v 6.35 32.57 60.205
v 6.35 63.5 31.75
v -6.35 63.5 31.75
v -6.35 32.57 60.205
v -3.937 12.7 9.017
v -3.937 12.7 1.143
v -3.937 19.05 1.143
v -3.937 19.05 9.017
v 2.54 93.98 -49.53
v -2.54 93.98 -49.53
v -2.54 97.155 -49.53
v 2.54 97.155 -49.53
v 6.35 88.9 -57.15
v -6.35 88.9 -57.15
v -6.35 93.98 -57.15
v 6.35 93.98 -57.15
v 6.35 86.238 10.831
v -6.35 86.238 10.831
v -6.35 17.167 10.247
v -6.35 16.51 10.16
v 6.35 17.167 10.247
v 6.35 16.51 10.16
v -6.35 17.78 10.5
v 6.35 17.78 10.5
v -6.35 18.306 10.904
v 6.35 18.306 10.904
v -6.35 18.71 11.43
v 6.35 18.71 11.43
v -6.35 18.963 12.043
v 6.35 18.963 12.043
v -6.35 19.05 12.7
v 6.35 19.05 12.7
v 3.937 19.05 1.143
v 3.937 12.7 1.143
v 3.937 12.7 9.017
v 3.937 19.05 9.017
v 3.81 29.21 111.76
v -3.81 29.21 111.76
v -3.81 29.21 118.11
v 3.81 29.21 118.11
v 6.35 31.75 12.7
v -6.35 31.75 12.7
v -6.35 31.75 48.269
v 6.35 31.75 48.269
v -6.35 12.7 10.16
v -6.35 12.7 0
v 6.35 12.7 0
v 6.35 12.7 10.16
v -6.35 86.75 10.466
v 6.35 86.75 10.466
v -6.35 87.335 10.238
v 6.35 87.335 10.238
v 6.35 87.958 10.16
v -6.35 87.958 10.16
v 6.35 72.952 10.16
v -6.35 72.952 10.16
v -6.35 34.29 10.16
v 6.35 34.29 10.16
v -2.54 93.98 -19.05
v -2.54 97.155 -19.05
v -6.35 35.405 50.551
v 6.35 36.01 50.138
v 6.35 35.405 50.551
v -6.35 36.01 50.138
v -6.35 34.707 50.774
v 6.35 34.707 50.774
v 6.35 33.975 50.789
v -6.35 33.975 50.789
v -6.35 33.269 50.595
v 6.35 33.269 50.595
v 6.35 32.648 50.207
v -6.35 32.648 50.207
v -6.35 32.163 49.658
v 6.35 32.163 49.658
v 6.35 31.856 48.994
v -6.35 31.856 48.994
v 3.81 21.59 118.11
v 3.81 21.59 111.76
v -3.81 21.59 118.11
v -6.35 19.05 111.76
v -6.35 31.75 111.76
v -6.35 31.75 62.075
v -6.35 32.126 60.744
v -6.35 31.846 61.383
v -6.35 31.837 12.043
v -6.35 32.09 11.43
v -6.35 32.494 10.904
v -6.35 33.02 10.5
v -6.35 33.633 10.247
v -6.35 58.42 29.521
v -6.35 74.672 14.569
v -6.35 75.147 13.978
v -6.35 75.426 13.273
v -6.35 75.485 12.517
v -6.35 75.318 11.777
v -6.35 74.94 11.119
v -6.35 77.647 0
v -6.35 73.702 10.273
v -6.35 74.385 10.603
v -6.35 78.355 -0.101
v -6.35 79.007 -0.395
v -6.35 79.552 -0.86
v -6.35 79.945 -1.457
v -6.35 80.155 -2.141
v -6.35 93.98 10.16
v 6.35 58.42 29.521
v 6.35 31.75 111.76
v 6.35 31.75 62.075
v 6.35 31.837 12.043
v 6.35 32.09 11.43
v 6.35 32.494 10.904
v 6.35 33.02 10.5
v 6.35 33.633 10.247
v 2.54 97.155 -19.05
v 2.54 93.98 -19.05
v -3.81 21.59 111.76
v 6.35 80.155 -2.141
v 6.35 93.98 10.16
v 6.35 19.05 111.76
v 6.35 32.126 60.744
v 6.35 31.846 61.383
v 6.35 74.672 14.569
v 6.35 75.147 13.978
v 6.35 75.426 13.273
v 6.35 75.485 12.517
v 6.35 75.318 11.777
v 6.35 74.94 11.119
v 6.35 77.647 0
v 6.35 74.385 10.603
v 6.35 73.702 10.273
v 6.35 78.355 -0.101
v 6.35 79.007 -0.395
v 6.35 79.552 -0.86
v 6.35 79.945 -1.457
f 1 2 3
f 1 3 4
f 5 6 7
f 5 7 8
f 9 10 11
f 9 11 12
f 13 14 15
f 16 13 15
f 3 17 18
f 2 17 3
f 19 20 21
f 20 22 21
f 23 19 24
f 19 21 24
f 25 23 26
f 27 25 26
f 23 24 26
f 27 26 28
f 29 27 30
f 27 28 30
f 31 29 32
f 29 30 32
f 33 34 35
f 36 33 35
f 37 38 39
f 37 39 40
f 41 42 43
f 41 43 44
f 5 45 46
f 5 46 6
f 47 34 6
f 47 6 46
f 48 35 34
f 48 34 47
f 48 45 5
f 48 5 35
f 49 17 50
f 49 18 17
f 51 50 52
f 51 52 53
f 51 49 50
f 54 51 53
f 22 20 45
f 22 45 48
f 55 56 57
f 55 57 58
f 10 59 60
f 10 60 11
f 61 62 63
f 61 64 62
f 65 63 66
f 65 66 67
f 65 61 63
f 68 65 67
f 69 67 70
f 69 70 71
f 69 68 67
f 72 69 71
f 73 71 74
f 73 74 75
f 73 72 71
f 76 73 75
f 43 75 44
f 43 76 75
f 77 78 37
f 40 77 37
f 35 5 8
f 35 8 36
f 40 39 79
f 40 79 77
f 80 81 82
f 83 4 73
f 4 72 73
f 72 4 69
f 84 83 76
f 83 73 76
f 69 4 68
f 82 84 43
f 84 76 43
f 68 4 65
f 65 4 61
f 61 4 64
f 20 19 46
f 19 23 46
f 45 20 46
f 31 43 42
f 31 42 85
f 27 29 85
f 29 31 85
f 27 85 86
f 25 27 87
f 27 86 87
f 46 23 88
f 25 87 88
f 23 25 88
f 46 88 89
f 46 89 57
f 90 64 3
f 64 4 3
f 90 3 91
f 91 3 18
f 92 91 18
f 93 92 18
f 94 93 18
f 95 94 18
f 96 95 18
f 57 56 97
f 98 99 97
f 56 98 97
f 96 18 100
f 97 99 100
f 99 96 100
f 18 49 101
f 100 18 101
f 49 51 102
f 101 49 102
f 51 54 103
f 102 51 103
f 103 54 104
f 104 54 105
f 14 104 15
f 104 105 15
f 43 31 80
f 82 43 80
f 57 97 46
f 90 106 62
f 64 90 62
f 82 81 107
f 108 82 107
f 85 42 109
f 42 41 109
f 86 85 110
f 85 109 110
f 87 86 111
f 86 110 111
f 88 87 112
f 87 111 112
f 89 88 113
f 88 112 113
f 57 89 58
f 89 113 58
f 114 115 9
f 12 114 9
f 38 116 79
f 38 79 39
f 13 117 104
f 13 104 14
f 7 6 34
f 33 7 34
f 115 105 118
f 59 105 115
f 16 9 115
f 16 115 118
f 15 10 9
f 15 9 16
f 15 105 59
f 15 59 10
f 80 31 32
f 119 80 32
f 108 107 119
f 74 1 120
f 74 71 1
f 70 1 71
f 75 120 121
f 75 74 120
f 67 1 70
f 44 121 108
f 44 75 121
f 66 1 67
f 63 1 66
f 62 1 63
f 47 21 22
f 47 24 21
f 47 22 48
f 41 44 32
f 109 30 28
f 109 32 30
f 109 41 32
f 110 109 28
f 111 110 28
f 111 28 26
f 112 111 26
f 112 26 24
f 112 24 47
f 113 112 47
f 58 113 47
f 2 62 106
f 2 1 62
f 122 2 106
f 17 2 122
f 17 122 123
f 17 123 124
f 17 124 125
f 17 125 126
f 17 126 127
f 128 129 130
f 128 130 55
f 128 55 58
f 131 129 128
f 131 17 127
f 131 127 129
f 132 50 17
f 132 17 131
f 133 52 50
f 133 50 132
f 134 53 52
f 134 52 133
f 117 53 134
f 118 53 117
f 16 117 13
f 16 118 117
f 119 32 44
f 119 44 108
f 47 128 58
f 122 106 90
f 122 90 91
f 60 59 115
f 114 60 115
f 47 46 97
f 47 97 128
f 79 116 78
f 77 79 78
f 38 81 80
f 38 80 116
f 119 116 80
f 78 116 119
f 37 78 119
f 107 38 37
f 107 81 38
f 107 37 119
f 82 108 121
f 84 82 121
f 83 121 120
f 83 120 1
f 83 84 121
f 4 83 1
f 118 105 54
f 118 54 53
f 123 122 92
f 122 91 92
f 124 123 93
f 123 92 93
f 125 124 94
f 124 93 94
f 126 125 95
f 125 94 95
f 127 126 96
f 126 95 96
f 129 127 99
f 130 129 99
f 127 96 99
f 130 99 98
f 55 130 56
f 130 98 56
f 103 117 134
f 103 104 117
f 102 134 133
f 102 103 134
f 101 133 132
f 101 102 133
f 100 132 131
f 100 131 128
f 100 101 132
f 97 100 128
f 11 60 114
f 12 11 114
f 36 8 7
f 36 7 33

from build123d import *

# Parameters (mm, degrees)
SKETCH1_R           = 5.08
SKETCH1_R_2         = 1.778
BOSS_EXTRUDE1_DEPTH = 10.16
SKETCH3_W           = 12.7
SKETCH3_H           = 12.7
BOSS_EXTRUDE2_DEPTH = 101.6
SKETCH6_W           = 7.62
SKETCH6_H           = 7.62
BOSS_EXTRUDE3_DEPTH = 6.35
BOSS_EXTRUDE4_START = -12.7
BOSS_EXTRUDE4_DEPTH = 12.7
FILLET2_R           = 2.54
BOSS_EXTRUDE5_START = -12.7
SKETCH7_W           = 57.15
SKETCH7_H           = 5.08
BOSS_EXTRUDE5_DEPTH = 12.7
SKETCH9_W           = 25.4
SKETCH9_H           = 25.4
CUT_EXTRUDE1_DEPTH  = 111.76
BOSS_EXTRUDE6_DEPTH = 12.7
FILLET3_R           = 2.54
SKETCH12_W          = 5.08
SKETCH12_H          = 30.48
BOSS_EXTRUDE7_DEPTH = 3.175
SKETCH13_W          = 7.874
SKETCH13_H          = 7.874
CUT_EXTRUDE3_DEPTH  = 6.35


with BuildPart() as part:
    # Sketch1 → Boss-Extrude1 (new body)
    with BuildSketch(Plane.XY):
        with BuildLine():
            Line((-6.35, 12.7), (-6.35, 10.998522628))
            ThreePointArc((-6.35, 10.998522628), (0, -12.7), (6.35, 10.998522628))
            Line((6.35, 10.998522628), (6.35, 43.18))
            Line((6.35, 43.18), (6.35, 93.98))
            Line((6.35, 93.98), (-6.35, 93.98))
            Line((-6.35, 93.98), (-6.35, 12.7))
        make_face()
        Circle(SKETCH1_R, mode=Mode.SUBTRACT)
        with Locations((0, 8.128)):
            Circle(SKETCH1_R_2, mode=Mode.SUBTRACT)
        with Locations((8.128, 0)):
            Circle(SKETCH1_R_2, mode=Mode.SUBTRACT)
        with Locations((0, -8.128)):
            Circle(SKETCH1_R_2, mode=Mode.SUBTRACT)
        with Locations((-8.128, 0)):
            Circle(SKETCH1_R_2, mode=Mode.SUBTRACT)
    extrude(amount=BOSS_EXTRUDE1_DEPTH)

    # Sketch3 → Boss-Extrude2 (add)
    with BuildSketch(Plane.XY.offset(10.16)):
        with Locations((0, 25.4)):
            Rectangle(SKETCH3_W, SKETCH3_H)
    extrude(amount=BOSS_EXTRUDE2_DEPTH)

    # Sketch6 → Boss-Extrude3 (add)
    with BuildSketch(Plane.XY.offset(111.76)):
        with Locations((0, 25.4)):
            Rectangle(SKETCH6_W, SKETCH6_H)
    extrude(amount=BOSS_EXTRUDE3_DEPTH)

    # Sketch5 → Boss-Extrude4 (add)
    with BuildSketch(Plane.ZY.offset(6.35).offset(BOSS_EXTRUDE4_START)):
        Polygon((31.75, 63.5), (60.96, 31.75), (54.057179058, 31.75), (49.383579058, 36.83), (29.520779058, 58.42), (10.16, 79.464325063), (10.16, 86.967391304), align=None)
    extrude(amount=BOSS_EXTRUDE4_DEPTH)

    # Fillet2
    fillet2_edges = [part.edges().sort_by_distance(p)[0] for p in [
        (0, 31.75, 60.96),
    ]]
    fillet(fillet2_edges, radius=FILLET2_R)

    # Sketch7 → Boss-Extrude5 (add)
    with BuildSketch(Plane(origin=(6.35, 0, 0), x_dir=(0, 0, -1), z_dir=(1, 0, 0)).offset(BOSS_EXTRUDE5_START)):
        with Locations((28.575, 91.44)):
            Rectangle(SKETCH7_W, SKETCH7_H)
    extrude(amount=BOSS_EXTRUDE5_DEPTH)

    # Sketch9 → Cut-Extrude1 (cut)
    with BuildSketch(Plane.XY.offset(111.76)):
        Rectangle(SKETCH9_W, SKETCH9_H)
    extrude(amount=-CUT_EXTRUDE1_DEPTH, mode=Mode.SUBTRACT)

    # Sketch11 → Boss-Extrude6 (add)
    with BuildSketch(Plane(origin=(6.35, 0, 0), x_dir=(0, 0, -1), z_dir=(1, 0, 0))):
        Polygon((0, 79.814999882), (57.15, 88.9), (0, 88.9), align=None)
    extrude(amount=-BOSS_EXTRUDE6_DEPTH)

    # Fillet3
    fillet3_edges = [part.edges().sort_by_distance(p)[0] for p in [
        (0, 79.814999882, 0),
        (0, 31.75, 10.16),
        (0, 19.05, 10.16),
        (0, 86.967391304, 10.16),
        (0, 79.464325063, 10.16),
        (0, 31.75, 54.057179058),
    ]]
    fillet(fillet3_edges, radius=FILLET3_R)

    # Sketch12 → Boss-Extrude7 (add)
    with BuildSketch(Plane(origin=(0, 93.98, 0), x_dir=(1, 0, 0), z_dir=(0, 1, 0))):
        with Locations((0, 34.29)):
            Rectangle(SKETCH12_W, SKETCH12_H)
    extrude(amount=BOSS_EXTRUDE7_DEPTH)

    # Sketch13 → Cut-Extrude3 (cut)
    with BuildSketch(Plane.XZ.offset(-12.7)):
        with Locations((0, 5.08)):
            Rectangle(SKETCH13_W, SKETCH13_H)
    extrude(amount=-CUT_EXTRUDE3_DEPTH, mode=Mode.SUBTRACT)


solid = part.part
